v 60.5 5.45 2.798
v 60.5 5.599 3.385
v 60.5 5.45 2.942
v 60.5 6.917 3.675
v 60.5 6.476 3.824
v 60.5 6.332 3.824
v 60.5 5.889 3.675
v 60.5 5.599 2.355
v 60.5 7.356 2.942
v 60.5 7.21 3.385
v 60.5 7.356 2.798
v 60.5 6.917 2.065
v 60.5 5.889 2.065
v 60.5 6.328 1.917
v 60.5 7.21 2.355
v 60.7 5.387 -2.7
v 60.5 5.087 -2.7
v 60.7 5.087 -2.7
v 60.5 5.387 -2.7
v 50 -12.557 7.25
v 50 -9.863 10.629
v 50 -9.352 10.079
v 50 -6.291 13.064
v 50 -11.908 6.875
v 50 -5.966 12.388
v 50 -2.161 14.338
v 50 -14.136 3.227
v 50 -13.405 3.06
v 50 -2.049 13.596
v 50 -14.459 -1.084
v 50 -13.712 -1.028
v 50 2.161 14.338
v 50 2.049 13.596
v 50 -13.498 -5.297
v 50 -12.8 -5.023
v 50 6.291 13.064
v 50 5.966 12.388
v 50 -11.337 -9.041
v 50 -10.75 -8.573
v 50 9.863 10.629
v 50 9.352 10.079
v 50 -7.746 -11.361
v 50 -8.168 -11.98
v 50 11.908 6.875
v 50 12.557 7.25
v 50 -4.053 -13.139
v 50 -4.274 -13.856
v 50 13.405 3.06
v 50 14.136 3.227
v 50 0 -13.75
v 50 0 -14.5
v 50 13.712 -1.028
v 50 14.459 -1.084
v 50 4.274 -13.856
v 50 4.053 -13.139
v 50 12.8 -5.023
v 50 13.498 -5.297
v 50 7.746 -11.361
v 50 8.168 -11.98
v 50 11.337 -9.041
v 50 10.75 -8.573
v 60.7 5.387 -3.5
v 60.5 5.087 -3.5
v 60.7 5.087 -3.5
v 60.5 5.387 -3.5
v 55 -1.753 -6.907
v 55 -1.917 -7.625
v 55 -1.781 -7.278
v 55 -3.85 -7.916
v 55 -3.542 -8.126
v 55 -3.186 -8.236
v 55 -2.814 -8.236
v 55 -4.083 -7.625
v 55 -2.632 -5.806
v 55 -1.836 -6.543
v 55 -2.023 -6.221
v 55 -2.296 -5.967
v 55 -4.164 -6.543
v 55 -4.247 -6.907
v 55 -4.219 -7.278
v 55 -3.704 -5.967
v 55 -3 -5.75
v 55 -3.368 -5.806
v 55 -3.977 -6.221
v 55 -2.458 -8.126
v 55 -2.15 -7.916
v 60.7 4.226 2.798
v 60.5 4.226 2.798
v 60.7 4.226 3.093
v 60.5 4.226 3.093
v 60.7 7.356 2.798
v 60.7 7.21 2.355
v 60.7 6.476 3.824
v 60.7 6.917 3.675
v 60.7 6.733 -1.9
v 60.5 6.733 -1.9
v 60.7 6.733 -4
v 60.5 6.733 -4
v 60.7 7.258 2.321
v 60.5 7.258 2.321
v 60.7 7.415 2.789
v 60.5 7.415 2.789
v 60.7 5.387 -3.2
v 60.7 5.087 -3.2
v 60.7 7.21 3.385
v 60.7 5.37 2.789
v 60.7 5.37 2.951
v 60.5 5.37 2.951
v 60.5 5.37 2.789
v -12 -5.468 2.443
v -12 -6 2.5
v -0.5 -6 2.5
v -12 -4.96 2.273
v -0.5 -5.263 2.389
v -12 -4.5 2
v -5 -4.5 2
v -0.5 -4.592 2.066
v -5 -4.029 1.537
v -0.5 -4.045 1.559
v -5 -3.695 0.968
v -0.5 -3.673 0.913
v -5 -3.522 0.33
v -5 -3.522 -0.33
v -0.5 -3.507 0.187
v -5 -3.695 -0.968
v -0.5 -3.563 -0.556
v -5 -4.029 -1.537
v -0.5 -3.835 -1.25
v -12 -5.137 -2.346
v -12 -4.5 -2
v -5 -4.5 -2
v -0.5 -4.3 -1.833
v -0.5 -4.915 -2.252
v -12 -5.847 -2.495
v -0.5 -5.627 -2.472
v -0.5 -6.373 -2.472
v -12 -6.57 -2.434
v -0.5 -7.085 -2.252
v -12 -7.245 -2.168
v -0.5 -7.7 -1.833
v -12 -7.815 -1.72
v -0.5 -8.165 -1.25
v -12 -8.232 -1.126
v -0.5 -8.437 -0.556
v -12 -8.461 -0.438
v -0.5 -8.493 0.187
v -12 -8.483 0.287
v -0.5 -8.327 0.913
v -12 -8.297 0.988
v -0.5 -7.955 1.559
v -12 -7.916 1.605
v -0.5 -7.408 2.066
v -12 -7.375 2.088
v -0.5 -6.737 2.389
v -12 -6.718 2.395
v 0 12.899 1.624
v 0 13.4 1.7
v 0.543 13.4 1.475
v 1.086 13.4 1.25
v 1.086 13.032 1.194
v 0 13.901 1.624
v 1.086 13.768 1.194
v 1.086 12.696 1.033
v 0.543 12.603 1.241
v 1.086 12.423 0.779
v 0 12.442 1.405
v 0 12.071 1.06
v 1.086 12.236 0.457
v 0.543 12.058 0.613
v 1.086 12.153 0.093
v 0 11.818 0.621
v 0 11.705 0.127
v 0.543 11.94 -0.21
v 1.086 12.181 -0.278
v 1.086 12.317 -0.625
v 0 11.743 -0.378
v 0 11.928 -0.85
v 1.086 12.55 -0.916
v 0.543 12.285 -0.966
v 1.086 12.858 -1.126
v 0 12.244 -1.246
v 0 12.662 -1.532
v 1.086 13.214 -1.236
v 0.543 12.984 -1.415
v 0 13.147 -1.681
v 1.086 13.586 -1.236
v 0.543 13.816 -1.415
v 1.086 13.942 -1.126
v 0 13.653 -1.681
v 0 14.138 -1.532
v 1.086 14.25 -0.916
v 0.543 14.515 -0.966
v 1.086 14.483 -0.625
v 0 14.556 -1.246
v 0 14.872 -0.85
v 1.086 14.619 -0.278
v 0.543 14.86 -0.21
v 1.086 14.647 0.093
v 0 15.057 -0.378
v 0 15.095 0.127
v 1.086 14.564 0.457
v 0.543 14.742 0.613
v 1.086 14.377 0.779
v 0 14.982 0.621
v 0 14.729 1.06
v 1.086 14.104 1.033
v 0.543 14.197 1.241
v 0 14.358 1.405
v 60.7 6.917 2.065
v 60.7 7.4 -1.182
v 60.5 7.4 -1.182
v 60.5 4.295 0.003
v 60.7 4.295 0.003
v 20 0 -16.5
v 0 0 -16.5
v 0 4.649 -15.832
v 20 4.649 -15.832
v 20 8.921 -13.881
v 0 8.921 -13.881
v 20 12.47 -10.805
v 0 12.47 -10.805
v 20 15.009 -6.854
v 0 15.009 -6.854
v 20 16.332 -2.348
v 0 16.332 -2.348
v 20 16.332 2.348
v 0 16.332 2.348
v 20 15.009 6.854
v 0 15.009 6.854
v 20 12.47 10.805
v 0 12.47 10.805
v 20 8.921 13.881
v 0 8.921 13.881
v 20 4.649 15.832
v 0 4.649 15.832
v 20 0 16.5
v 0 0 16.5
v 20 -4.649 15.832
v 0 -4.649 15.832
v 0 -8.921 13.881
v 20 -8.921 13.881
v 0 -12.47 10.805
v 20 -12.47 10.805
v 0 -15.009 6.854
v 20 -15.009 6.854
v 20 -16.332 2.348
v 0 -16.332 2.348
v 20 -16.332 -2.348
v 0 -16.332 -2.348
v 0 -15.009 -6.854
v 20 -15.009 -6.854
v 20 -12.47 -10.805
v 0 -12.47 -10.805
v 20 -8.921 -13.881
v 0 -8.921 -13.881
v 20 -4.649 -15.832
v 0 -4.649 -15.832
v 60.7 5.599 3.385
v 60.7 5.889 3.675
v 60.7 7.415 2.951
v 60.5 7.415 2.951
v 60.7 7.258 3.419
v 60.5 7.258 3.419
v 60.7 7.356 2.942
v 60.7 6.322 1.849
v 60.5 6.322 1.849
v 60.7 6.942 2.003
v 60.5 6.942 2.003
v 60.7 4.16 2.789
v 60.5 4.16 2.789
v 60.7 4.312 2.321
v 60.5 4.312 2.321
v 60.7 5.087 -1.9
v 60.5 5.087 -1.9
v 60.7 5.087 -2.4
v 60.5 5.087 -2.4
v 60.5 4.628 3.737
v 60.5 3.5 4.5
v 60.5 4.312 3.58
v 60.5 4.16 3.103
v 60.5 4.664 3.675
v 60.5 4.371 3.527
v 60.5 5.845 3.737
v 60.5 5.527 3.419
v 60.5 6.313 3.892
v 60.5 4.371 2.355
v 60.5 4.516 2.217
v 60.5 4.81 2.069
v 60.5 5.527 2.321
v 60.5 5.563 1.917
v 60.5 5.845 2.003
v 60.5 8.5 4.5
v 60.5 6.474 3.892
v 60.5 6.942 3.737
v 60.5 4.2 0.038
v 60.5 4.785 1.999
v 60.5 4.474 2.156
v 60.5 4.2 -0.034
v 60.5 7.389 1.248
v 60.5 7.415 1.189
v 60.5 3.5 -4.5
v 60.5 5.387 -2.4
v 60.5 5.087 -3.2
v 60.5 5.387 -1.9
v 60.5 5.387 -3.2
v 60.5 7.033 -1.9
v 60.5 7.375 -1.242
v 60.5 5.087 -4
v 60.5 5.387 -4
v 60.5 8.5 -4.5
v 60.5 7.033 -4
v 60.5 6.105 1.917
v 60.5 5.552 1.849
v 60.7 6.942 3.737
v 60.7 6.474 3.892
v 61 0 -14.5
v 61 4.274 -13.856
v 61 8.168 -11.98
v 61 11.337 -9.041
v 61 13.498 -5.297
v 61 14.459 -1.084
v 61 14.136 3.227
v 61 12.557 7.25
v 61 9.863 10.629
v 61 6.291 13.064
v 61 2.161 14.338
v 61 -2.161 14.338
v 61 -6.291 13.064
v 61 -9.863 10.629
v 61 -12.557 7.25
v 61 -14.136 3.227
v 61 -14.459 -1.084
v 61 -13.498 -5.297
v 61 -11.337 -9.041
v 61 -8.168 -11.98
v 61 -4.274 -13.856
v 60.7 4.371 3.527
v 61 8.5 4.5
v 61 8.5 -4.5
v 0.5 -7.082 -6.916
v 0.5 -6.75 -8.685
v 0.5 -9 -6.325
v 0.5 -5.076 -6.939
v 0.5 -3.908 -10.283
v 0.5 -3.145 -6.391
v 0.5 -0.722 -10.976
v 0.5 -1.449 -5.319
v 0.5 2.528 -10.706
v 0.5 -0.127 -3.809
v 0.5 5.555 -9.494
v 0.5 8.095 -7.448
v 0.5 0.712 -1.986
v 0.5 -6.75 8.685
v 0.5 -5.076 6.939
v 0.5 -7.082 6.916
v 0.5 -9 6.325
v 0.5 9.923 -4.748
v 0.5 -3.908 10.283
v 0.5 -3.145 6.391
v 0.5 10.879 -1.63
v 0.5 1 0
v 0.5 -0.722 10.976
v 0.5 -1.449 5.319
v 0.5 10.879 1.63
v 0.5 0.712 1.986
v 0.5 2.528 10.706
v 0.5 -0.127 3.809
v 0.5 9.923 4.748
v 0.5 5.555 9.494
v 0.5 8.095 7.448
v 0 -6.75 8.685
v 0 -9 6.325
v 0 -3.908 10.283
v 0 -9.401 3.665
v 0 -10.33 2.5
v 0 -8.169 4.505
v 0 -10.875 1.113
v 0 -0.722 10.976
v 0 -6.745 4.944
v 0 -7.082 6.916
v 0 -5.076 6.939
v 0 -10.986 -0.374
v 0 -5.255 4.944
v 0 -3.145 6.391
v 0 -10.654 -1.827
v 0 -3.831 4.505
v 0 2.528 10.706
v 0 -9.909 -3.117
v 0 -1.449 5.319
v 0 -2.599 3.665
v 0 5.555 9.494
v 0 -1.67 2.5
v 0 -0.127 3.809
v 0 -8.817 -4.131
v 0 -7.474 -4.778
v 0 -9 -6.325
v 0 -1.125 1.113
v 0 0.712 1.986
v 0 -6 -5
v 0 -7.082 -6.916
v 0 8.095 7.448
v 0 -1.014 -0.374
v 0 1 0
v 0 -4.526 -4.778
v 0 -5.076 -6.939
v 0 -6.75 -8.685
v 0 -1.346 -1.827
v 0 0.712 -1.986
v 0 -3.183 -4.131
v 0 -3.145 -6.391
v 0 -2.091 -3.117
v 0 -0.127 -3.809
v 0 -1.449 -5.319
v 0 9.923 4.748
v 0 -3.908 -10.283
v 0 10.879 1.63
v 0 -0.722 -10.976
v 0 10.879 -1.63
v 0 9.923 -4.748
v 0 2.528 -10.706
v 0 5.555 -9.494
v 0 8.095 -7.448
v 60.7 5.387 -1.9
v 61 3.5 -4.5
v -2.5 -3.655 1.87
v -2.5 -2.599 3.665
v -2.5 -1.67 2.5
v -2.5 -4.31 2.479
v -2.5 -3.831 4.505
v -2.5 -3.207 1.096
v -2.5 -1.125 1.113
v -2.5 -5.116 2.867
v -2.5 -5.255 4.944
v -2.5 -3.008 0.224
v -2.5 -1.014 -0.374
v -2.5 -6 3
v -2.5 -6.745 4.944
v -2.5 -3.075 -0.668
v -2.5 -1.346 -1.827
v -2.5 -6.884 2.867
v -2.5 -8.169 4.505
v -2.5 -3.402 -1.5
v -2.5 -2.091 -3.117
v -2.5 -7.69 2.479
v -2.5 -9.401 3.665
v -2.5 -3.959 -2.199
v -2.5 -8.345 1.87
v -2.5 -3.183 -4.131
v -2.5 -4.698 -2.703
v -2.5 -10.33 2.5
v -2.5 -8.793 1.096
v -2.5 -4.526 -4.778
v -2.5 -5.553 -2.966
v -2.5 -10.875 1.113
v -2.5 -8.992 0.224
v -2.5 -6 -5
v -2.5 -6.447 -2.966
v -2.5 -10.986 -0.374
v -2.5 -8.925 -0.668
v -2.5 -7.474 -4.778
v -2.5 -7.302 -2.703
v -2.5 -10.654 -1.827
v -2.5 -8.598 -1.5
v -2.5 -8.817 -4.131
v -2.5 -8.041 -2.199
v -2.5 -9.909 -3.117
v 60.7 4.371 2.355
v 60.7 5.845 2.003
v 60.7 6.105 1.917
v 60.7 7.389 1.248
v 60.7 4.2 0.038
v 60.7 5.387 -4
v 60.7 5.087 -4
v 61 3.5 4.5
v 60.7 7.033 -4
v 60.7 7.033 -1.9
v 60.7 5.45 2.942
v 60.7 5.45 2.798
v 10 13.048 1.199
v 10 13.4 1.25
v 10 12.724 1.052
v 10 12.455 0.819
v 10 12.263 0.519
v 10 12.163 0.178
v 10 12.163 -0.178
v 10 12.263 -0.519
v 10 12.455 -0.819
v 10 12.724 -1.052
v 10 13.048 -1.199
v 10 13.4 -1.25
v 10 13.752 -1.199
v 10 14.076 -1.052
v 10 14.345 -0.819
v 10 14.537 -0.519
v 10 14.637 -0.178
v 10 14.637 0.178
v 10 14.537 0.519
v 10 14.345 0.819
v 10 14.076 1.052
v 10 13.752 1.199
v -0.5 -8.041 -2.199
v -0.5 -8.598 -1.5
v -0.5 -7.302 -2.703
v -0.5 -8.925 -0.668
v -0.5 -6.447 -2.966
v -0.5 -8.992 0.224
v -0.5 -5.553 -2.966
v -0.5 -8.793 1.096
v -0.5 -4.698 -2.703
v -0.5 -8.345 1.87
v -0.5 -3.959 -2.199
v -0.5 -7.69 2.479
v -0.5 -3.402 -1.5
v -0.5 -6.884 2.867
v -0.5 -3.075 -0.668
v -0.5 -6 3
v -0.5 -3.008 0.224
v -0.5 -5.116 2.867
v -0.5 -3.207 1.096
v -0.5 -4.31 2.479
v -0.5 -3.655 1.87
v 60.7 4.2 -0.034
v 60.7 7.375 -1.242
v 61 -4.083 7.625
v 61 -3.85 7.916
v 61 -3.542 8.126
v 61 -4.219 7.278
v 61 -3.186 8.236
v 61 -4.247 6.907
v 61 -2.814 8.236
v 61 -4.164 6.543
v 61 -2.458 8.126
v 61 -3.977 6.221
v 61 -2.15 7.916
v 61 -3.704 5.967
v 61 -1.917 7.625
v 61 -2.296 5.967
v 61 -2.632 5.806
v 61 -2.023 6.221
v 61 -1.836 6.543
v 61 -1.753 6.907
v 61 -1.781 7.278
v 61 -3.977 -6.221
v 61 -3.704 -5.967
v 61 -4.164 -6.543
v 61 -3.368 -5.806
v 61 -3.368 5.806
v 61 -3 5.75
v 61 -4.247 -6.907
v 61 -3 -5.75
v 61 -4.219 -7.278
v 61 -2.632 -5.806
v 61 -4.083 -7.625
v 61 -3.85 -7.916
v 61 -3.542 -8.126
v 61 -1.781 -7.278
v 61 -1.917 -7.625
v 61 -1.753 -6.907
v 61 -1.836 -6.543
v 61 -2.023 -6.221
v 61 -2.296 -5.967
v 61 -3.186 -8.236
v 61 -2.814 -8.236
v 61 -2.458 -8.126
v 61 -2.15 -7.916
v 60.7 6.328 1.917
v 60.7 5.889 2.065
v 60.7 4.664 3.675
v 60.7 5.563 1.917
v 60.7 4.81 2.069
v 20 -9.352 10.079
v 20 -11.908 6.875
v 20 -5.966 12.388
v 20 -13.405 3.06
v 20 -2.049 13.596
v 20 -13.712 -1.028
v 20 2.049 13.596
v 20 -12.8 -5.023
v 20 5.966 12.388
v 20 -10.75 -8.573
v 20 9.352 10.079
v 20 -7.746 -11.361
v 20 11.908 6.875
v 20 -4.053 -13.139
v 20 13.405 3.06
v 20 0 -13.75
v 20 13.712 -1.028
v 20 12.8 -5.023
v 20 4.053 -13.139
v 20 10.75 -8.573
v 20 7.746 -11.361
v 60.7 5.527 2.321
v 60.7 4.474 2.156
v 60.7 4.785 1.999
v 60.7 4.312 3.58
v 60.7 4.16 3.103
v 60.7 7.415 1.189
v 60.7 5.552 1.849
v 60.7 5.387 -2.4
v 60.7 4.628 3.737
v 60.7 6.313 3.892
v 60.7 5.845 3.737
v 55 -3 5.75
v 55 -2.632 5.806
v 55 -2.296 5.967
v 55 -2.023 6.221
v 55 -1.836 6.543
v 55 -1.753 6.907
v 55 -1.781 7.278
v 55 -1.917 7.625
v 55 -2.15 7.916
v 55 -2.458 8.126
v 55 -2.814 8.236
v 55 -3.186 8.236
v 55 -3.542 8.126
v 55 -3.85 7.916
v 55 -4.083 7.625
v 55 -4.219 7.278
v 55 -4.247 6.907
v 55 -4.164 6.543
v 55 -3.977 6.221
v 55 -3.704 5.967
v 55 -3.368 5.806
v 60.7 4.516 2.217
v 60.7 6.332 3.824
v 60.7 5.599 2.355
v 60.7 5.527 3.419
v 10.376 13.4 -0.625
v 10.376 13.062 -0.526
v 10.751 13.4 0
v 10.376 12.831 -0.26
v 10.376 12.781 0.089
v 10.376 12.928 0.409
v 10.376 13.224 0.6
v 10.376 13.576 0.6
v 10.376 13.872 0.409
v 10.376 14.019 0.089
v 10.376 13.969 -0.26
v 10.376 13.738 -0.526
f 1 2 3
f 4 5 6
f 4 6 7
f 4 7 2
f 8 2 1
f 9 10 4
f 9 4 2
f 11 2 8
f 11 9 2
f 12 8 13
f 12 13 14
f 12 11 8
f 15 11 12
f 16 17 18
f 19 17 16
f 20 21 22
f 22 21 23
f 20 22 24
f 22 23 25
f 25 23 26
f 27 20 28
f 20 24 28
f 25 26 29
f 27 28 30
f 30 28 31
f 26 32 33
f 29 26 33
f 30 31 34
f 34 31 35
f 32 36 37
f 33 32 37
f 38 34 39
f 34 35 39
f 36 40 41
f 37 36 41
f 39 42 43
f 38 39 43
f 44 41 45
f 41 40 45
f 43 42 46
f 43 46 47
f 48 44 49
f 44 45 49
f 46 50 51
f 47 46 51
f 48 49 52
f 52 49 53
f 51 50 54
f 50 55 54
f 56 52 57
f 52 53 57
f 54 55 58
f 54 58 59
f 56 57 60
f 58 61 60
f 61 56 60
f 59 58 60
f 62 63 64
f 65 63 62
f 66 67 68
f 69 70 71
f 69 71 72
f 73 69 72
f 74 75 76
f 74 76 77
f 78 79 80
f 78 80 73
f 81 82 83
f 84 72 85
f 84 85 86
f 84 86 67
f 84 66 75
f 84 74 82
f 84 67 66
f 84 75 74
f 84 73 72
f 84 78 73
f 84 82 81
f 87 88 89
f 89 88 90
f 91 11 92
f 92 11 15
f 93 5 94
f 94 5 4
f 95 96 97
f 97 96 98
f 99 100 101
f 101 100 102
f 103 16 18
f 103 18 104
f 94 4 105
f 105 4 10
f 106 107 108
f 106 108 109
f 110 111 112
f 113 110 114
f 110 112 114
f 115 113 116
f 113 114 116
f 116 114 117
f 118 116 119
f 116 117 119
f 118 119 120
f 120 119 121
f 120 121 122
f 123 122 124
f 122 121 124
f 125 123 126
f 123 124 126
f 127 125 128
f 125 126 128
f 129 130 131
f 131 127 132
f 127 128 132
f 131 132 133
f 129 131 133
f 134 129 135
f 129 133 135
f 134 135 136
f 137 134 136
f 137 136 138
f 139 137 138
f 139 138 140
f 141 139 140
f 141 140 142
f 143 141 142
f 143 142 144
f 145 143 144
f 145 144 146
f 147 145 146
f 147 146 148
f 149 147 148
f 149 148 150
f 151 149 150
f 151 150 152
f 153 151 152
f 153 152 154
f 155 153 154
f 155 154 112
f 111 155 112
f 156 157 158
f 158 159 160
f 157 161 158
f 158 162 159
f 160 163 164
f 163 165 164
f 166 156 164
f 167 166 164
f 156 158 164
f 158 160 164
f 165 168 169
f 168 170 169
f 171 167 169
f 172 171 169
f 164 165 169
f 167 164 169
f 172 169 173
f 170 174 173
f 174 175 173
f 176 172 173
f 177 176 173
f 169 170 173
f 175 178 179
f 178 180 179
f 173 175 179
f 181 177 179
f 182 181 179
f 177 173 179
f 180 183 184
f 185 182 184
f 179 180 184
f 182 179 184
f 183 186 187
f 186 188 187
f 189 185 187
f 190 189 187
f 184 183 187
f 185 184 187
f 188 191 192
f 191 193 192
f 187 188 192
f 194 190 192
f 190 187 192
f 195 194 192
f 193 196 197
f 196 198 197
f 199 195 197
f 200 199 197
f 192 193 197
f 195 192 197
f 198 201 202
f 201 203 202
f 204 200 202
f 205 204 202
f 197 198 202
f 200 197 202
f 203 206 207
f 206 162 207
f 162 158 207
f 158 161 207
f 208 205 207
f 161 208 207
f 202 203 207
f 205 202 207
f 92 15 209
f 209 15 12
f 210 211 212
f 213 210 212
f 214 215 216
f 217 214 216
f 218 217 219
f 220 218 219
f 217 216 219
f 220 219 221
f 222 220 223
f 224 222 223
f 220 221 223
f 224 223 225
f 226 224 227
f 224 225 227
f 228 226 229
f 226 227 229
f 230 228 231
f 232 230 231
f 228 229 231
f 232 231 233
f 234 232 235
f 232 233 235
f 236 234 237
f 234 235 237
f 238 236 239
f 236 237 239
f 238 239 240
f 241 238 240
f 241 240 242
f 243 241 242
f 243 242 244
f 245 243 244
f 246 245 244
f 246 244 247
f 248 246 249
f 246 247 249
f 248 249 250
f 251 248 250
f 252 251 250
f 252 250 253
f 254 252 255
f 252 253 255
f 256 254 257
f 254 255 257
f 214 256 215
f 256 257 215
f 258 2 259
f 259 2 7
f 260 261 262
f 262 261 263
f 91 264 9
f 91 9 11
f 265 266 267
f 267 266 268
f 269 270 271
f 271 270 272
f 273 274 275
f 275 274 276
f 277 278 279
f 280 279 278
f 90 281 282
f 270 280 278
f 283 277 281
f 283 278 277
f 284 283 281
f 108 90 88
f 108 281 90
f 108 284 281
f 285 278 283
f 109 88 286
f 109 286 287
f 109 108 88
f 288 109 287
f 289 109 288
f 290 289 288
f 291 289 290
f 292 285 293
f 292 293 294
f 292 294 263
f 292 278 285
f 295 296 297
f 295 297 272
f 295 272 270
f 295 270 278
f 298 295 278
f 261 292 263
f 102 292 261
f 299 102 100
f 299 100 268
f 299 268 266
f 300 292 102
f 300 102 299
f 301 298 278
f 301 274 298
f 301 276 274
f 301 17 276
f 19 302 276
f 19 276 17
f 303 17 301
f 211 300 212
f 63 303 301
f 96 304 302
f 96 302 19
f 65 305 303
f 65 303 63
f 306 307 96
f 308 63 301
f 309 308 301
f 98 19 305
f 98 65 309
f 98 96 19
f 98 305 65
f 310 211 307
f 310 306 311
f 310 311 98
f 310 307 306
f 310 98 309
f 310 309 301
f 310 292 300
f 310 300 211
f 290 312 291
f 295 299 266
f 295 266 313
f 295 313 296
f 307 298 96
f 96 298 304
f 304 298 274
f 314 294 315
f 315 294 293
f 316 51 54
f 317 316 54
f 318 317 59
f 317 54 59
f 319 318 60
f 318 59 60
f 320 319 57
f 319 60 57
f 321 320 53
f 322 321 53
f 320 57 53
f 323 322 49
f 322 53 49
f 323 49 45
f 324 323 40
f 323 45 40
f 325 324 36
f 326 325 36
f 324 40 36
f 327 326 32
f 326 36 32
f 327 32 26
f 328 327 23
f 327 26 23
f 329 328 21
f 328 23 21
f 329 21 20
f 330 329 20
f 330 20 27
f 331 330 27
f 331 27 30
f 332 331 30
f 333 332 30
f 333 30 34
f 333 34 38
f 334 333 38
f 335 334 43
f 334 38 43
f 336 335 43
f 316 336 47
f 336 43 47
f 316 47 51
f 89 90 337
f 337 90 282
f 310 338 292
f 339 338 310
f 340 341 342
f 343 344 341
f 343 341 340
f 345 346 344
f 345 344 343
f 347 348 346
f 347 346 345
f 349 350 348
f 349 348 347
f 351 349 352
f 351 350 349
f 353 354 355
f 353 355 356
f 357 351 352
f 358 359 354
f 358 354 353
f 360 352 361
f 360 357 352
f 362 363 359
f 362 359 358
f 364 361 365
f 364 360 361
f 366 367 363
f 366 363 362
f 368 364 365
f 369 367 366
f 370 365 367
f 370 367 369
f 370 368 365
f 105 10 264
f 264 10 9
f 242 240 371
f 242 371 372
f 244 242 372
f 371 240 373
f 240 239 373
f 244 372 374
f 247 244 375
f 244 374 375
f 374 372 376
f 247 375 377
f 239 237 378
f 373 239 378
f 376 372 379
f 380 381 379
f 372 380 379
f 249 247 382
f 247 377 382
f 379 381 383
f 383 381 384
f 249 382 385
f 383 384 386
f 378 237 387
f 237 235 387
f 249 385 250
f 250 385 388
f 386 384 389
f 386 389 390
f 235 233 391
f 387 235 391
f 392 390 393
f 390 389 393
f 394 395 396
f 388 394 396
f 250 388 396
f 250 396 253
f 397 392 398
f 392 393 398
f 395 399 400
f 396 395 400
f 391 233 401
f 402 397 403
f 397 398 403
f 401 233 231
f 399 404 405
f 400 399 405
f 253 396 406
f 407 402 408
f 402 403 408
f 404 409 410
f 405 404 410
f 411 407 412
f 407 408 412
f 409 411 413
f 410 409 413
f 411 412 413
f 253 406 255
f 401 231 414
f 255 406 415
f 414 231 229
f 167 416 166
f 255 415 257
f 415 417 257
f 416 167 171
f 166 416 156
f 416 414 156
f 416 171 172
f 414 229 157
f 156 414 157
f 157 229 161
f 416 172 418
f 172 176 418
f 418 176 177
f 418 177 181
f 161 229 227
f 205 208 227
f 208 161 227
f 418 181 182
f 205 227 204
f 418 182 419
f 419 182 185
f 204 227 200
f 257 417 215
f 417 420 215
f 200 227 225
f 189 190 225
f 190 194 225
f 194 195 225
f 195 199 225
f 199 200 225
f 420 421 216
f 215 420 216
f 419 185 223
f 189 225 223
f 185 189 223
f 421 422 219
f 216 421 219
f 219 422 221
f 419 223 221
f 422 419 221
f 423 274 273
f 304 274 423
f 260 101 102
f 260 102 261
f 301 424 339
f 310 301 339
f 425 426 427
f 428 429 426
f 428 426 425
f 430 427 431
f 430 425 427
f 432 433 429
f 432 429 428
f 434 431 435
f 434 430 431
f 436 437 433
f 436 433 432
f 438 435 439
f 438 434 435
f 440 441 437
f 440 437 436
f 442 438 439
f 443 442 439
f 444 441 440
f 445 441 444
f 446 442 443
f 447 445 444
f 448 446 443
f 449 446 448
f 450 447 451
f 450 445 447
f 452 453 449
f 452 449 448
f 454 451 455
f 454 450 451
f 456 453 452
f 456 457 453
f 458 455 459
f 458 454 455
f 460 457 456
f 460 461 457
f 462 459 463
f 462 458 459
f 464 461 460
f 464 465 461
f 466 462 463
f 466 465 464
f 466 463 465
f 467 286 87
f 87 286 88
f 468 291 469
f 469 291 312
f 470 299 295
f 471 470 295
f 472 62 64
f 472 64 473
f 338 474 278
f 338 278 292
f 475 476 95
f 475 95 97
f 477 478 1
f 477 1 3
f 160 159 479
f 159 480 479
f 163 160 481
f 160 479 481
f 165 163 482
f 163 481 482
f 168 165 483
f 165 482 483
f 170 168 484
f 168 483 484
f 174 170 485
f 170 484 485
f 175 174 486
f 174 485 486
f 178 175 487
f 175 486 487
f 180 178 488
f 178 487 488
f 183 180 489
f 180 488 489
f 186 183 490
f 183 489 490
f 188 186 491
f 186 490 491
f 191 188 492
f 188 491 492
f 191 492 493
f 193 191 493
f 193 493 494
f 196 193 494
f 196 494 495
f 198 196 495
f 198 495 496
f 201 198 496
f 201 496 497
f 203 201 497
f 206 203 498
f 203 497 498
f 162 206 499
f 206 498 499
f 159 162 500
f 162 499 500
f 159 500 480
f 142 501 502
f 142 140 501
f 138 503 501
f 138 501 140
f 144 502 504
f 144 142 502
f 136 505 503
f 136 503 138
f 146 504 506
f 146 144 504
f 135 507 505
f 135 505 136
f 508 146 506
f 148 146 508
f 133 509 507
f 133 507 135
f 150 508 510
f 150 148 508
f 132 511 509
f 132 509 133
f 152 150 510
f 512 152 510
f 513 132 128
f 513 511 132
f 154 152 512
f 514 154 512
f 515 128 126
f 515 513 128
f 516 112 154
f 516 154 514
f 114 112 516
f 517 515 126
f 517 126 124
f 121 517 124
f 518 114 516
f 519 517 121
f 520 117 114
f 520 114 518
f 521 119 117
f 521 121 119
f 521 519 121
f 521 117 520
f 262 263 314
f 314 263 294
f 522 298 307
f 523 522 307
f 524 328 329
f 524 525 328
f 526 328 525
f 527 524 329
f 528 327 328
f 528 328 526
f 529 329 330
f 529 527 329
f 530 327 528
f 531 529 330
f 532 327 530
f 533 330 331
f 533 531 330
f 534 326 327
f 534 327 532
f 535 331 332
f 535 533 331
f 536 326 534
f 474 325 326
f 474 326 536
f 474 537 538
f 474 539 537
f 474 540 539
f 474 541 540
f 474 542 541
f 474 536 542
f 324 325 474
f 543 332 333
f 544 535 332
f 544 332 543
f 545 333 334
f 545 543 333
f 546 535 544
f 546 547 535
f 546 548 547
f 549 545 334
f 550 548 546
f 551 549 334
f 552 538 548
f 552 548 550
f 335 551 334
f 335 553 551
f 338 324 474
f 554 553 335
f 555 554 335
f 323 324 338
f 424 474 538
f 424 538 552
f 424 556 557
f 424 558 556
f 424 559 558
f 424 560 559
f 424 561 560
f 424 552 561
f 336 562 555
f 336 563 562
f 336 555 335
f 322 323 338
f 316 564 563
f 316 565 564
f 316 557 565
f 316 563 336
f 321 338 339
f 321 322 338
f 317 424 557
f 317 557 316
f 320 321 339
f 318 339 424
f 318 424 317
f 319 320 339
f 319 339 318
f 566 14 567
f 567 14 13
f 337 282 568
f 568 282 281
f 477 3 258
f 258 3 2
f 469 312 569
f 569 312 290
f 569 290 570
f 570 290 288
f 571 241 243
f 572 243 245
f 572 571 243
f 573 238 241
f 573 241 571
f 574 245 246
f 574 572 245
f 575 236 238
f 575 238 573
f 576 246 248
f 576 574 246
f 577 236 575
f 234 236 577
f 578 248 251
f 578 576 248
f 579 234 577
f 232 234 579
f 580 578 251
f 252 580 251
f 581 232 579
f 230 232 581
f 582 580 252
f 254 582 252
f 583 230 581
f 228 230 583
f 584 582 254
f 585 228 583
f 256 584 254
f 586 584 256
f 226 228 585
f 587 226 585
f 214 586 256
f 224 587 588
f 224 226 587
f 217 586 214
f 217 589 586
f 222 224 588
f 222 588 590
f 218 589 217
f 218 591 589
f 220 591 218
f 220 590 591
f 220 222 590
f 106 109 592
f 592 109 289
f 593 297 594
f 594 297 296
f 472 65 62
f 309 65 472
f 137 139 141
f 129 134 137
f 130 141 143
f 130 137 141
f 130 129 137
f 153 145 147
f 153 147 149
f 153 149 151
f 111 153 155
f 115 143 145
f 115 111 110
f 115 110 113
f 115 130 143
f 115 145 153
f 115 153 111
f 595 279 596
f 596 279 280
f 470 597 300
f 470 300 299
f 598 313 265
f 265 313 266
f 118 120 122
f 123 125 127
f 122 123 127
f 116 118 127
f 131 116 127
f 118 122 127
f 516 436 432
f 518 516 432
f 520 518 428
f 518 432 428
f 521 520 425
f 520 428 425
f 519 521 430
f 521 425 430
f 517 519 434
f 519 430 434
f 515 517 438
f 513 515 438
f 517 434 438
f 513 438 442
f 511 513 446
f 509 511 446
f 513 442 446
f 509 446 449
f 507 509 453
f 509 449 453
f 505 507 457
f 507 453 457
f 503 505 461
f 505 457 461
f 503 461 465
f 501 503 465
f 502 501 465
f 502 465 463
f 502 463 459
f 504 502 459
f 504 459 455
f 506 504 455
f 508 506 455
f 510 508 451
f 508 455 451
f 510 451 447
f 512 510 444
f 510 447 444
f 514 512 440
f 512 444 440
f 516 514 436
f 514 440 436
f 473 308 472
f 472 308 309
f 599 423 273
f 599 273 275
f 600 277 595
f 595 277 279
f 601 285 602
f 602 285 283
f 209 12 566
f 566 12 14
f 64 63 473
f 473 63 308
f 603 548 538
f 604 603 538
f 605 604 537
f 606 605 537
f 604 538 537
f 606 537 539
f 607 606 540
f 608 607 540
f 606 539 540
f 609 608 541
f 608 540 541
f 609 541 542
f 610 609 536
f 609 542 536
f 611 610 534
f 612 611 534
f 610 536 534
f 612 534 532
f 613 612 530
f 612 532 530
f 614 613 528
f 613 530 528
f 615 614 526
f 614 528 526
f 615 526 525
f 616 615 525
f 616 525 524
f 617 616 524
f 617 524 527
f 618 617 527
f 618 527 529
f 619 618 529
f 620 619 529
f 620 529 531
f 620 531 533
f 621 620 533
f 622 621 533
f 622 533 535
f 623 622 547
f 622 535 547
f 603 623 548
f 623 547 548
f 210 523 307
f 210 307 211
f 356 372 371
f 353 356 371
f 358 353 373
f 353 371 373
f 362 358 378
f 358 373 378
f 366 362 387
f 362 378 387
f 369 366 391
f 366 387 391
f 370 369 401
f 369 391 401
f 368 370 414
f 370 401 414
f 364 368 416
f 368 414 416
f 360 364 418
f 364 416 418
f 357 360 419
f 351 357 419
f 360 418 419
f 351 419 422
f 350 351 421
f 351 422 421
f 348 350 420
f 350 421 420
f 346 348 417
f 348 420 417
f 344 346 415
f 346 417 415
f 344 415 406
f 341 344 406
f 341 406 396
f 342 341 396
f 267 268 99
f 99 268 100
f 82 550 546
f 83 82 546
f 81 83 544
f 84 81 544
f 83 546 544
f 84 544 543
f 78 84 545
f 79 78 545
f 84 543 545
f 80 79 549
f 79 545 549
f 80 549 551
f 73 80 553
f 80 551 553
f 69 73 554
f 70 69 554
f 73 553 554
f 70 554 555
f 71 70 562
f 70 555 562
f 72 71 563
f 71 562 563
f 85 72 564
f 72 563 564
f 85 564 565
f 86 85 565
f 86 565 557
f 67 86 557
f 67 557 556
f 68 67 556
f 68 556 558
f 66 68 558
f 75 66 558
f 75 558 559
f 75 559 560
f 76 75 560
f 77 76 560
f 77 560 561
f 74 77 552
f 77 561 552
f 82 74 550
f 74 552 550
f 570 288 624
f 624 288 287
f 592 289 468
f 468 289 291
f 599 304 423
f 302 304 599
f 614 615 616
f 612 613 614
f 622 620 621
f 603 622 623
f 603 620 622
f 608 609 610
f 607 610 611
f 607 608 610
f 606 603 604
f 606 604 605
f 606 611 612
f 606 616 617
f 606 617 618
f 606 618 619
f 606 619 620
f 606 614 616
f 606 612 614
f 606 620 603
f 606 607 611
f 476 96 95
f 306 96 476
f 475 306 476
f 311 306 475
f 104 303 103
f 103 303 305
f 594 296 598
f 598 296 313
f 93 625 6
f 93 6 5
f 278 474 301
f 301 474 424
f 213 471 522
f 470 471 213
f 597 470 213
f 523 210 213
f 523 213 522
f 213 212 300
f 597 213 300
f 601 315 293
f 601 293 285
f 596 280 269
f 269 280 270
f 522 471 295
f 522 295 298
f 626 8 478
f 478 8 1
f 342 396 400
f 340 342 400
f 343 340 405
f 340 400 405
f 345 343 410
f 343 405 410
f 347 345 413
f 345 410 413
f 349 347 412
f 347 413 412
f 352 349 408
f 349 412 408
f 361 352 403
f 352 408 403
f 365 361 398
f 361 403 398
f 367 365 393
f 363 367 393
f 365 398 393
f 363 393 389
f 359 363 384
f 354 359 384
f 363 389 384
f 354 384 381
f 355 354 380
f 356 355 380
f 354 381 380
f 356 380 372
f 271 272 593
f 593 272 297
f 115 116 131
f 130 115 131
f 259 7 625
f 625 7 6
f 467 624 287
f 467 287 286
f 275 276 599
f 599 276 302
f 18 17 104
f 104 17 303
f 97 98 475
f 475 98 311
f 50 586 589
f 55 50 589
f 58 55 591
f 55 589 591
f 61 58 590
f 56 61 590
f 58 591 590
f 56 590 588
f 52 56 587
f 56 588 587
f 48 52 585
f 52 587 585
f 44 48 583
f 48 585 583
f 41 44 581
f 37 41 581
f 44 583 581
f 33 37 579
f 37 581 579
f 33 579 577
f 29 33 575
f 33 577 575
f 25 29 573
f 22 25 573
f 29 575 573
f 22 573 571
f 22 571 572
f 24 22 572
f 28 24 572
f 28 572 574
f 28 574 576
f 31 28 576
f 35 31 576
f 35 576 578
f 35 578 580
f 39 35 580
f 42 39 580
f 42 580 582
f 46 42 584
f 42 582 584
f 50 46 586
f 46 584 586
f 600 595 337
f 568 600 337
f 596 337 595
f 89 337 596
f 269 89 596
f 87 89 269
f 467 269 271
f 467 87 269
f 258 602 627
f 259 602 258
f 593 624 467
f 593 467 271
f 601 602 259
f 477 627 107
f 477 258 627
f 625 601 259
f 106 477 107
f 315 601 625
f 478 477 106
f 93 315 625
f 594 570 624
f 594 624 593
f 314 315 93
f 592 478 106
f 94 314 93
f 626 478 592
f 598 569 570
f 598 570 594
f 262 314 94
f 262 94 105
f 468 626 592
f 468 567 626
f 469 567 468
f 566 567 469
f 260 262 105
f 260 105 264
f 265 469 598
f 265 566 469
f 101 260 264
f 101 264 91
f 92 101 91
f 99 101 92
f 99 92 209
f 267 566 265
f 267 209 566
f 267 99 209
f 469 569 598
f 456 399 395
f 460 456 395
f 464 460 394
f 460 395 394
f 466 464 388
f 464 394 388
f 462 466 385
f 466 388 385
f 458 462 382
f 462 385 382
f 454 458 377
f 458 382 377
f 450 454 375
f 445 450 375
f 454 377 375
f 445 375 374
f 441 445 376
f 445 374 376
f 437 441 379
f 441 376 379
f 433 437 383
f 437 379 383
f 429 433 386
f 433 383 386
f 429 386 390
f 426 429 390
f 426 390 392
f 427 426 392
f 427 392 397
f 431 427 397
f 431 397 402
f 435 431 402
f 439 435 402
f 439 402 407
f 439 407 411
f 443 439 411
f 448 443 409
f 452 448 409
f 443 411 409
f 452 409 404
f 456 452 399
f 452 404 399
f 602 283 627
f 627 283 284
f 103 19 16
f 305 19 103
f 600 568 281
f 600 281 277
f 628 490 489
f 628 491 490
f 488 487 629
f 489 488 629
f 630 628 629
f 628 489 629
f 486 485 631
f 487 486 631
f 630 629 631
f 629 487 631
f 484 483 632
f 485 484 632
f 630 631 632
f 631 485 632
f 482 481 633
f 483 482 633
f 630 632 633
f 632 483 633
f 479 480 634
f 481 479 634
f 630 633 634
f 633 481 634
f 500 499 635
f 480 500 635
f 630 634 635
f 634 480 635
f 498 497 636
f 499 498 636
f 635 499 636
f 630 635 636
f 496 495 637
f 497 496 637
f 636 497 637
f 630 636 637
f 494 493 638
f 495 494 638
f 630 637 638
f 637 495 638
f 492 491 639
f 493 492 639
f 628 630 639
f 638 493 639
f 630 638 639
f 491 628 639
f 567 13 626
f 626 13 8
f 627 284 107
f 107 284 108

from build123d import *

# Parameters (mm, degrees)
SKETCH_1_R                   = 16.5
EXTRUDE_1_DEPTH              = 20
SKETCH_2_R                   = 13.75
EXTRUDE_2_DEPTH              = 30
SKETCH_3_R                   = 14.5
EXTRUDE_3_DEPTH              = 11
SKETCH_4_W                   = 9
SKETCH_4_H                   = 5
CUT_EXTRUDE_1_DEPTH          = 0.5
WRAP_1_OUTLINE_W             = 2.1
WRAP_1_OUTLINE_H             = 0.3
WRAP_1_OUTLINE_W_2           = 0.5
WRAP_1_DEPTH                 = 0.2
SKETCH_6_R                   = 1.25
CUT_EXTRUDE_2_DEPTH          = 6
CUT_EXTRUDE_3_DEPTH          = 0.5
SKETCH_8_R                   = 5
EXTRUDE_4_DEPTH              = 2.5
SKETCH_9_R                   = 3
CUT_EXTRUDE_4_DEPTH          = 2
SKETCH_10_R                  = 2.5
EXTRUDE_5_DEPTH              = 11.5
CUT_EXTRUDE_START            = -7
CUT_EXTRUDE_5_DEPTH          = 7
HOLE_WIZARD_M3_1_D           = 2.5
HOLE_WIZARD_M3_1_DEPTH       = 10
HOLE_WIZARD_M3_1_CSINK_D     = 3.4
HOLE_WIZARD_M3_1_CSINK_ANGLE = 45
HOLE_WIZARD_M3_1_TIP         = 0.751075774


# Read off the part's stored shape, not the designer's step: 包覆1
with BuildPart() as part:
    # 草图1 → 凸台-拉伸1 (new body)
    with BuildSketch(Plane(origin=(0, 0, 0), x_dir=(0, 0, -1), z_dir=(1, 0, 0))):
        Circle(SKETCH_1_R)
    extrude(amount=EXTRUDE_1_DEPTH)

    # 草图2 → 凸台-拉伸2 (add)
    with BuildSketch(Plane(origin=(20, 0, 0), x_dir=(0, 0, -1), z_dir=(1, 0, 0))):
        Circle(SKETCH_2_R)
    extrude(amount=EXTRUDE_2_DEPTH)

    # 草图3 → 凸台-拉伸3 (add)
    with BuildSketch(Plane(origin=(50, 0, 0), x_dir=(0, 0, -1), z_dir=(1, 0, 0))):
        Circle(SKETCH_3_R)
    extrude(amount=EXTRUDE_3_DEPTH)

    # 草图4 → 切除-拉伸1 (cut)
    with BuildSketch(Plane(origin=(61, 0, 0), x_dir=(0, 0, -1), z_dir=(1, 0, 0))):
        with Locations((0, 6)):
            Rectangle(SKETCH_4_W, SKETCH_4_H)
    extrude(amount=-CUT_EXTRUDE_1_DEPTH, mode=Mode.SUBTRACT)

    # 包覆1 outline → 包覆1 (add)
    # profile 1 of 6: a face of its own
    with BuildSketch(Plane(origin=(60.5, 0, 0), x_dir=(0, 0, -1), z_dir=(1, 0, 0))):
        Polygon((-2.789418513, 5.369902097), (-2.320955301, 5.52689379), (-2.003204114, 5.844644976), (-1.916544699, 6.105251187), (-1.916544699, 5.562687896), (-2.069140625, 4.810383703), (-2.217340783, 4.515867286), (-2.354865506, 4.371434929), (-2.798210047, 4.225746638), (-3.092726464, 4.225746638), (-3.52727947, 4.371434929), (-3.675479628, 4.664067445), (-3.737020372, 4.628273339), (-3.580028679, 4.312406052), (-3.103401899, 4.159810127), (-2.789418513, 4.159810127), (-2.320955301, 4.312406052), (-2.15580004, 4.473793513), (-1.998808347, 4.785265032), (-1.848724288, 5.55201246), (-1.848724288, 6.321899723), (-2.003204114, 6.942330894), (-2.320955301, 7.25819818), (-2.789418513, 7.415189873), (-2.950805973, 7.415189873), (-3.419269185, 7.25819818), (-3.737020372, 6.942330894), (-3.891500198, 6.473867682), (-3.891500198, 6.313108188), (-3.737020372, 5.844644976), (-3.419269185, 5.52689379), (-2.950805973, 5.369902097), align=None)
        Polygon((-2.798210047, 7.35553303), (-2.354865506, 7.209844739), (-2.064744858, 6.917212223), (-1.916544699, 6.328179391), (-2.064744858, 5.889230617), (-2.354865506, 5.599109968), (-2.798210047, 5.450281843), (-2.942014438, 5.450281843), (-3.385358979, 5.599109968), (-3.675479628, 5.889230617), (-3.823679786, 6.331947191), (-3.823679786, 6.476379549), (-3.675479628, 6.917212223), (-3.385358979, 7.209844739), (-2.942014438, 7.35553303), align=None, mode=Mode.SUBTRACT)
    # profile 2 of 6: a face of its own
    with BuildSketch(Plane(origin=(60.5, 0, 0), x_dir=(0, 0, -1), z_dir=(1, 0, 0))):
        Polygon((-1.248388054, 7.389443236), (-0.038296084, 4.2), (0.033920095, 4.2), (1.241500198, 7.375), (1.182471321, 7.400118671), (-0.002501978, 4.295450949), (-1.189359177, 7.415189873), align=None)
    # profile 3 of 6: a face of its own
    with BuildSketch(Plane(origin=(60.5, 0, 0), x_dir=(0, 0, -1), z_dir=(1, 0, 0))):
        with Locations((2.95, 6.883089037)):
            Rectangle(WRAP_1_OUTLINE_W, WRAP_1_OUTLINE_H)
    # profile 4 of 6: a face of its own
    with BuildSketch(Plane(origin=(60.5, 0, 0), x_dir=(0, 0, -1), z_dir=(1, 0, 0))):
        with Locations((3.75, 5.236905413)):
            Rectangle(WRAP_1_OUTLINE_W_2, WRAP_1_OUTLINE_H)
    # profile 5 of 6: a face of its own
    with BuildSketch(Plane(origin=(60.5, 0, 0), x_dir=(0, 0, -1), z_dir=(1, 0, 0))):
        with Locations((2.15, 5.236905413)):
            Rectangle(WRAP_1_OUTLINE_W_2, WRAP_1_OUTLINE_H)
    # profile 6 of 6: a face of its own
    with BuildSketch(Plane(origin=(60.5, 0, 0), x_dir=(0, 0, -1), z_dir=(1, 0, 0))):
        with Locations((2.95, 5.236905413)):
            Rectangle(WRAP_1_OUTLINE_W_2, WRAP_1_OUTLINE_H)
    extrude(amount=WRAP_1_DEPTH)

    # 草图6 → 切除-拉伸2 (cut)
    with BuildSketch(Plane(origin=(61, 0, 0), x_dir=(0, 0, -1), z_dir=(1, 0, 0))):
        with Locations((-7, -3)):
            Circle(SKETCH_6_R)
        with Locations(Location((7, -3, 0), (0, 0, 180))):
            Circle(SKETCH_6_R)
    extrude(amount=-CUT_EXTRUDE_2_DEPTH, mode=Mode.SUBTRACT)

    # 草图7 → 切除-拉伸3 (cut)
    with BuildSketch(Plane.ZY):
        with BuildLine():
            ThreePointArc((6.32455532, -9), (0, 11), (-6.32455532, -9))
            ThreePointArc((-6.32455532, -9), (0, 1), (6.32455532, -9))
        make_face()
    extrude(amount=-CUT_EXTRUDE_3_DEPTH, mode=Mode.SUBTRACT)

    # 草图8 → 凸台-拉伸4 (add)
    with BuildSketch(Plane.ZY):
        with Locations(Location((0, -6, 0), (0, 0, 180))):
            Circle(SKETCH_8_R)
    extrude(amount=EXTRUDE_4_DEPTH)

    # 草图9 → 切除-拉伸4 (cut)
    with BuildSketch(Plane.ZY.offset(2.5)):
        with Locations((0, -6)):
            Circle(SKETCH_9_R)
    extrude(amount=-CUT_EXTRUDE_4_DEPTH, mode=Mode.SUBTRACT)

    # 草图10 → 凸台-拉伸5 (add)
    with BuildSketch(Plane.ZY.offset(0.5)):
        with Locations((0, -6)):
            Circle(SKETCH_10_R)
    extrude(amount=EXTRUDE_5_DEPTH)

    # 草图11 → 切除-拉伸5 (cut)
    with BuildSketch(Plane.ZY.offset(12).offset(CUT_EXTRUDE_START)):
        with BuildLine():
            Line((0, -4.5), (-2, -4.5))
            ThreePointArc((-2, -4.5), (0, -3.5), (2, -4.5))
            Line((2, -4.5), (0, -4.5))
        make_face()
    extrude(amount=CUT_EXTRUDE_5_DEPTH, mode=Mode.SUBTRACT)

    # M3 螺纹孔1
    with Locations(Plane(origin=(0, 13.4, 0), x_dir=(0, 0, -1), z_dir=(-1, 0, 0))):
        with Locations((0, 0)):
            CounterSinkHole(HOLE_WIZARD_M3_1_D / 2, HOLE_WIZARD_M3_1_CSINK_D / 2, depth=HOLE_WIZARD_M3_1_DEPTH, counter_sink_angle=HOLE_WIZARD_M3_1_CSINK_ANGLE)
            with Locations((0, 0, -(HOLE_WIZARD_M3_1_DEPTH + HOLE_WIZARD_M3_1_TIP / 2))):  # 118° drill point
                Cone(0, HOLE_WIZARD_M3_1_D / 2, HOLE_WIZARD_M3_1_TIP, mode=Mode.SUBTRACT)


solid = part.part
